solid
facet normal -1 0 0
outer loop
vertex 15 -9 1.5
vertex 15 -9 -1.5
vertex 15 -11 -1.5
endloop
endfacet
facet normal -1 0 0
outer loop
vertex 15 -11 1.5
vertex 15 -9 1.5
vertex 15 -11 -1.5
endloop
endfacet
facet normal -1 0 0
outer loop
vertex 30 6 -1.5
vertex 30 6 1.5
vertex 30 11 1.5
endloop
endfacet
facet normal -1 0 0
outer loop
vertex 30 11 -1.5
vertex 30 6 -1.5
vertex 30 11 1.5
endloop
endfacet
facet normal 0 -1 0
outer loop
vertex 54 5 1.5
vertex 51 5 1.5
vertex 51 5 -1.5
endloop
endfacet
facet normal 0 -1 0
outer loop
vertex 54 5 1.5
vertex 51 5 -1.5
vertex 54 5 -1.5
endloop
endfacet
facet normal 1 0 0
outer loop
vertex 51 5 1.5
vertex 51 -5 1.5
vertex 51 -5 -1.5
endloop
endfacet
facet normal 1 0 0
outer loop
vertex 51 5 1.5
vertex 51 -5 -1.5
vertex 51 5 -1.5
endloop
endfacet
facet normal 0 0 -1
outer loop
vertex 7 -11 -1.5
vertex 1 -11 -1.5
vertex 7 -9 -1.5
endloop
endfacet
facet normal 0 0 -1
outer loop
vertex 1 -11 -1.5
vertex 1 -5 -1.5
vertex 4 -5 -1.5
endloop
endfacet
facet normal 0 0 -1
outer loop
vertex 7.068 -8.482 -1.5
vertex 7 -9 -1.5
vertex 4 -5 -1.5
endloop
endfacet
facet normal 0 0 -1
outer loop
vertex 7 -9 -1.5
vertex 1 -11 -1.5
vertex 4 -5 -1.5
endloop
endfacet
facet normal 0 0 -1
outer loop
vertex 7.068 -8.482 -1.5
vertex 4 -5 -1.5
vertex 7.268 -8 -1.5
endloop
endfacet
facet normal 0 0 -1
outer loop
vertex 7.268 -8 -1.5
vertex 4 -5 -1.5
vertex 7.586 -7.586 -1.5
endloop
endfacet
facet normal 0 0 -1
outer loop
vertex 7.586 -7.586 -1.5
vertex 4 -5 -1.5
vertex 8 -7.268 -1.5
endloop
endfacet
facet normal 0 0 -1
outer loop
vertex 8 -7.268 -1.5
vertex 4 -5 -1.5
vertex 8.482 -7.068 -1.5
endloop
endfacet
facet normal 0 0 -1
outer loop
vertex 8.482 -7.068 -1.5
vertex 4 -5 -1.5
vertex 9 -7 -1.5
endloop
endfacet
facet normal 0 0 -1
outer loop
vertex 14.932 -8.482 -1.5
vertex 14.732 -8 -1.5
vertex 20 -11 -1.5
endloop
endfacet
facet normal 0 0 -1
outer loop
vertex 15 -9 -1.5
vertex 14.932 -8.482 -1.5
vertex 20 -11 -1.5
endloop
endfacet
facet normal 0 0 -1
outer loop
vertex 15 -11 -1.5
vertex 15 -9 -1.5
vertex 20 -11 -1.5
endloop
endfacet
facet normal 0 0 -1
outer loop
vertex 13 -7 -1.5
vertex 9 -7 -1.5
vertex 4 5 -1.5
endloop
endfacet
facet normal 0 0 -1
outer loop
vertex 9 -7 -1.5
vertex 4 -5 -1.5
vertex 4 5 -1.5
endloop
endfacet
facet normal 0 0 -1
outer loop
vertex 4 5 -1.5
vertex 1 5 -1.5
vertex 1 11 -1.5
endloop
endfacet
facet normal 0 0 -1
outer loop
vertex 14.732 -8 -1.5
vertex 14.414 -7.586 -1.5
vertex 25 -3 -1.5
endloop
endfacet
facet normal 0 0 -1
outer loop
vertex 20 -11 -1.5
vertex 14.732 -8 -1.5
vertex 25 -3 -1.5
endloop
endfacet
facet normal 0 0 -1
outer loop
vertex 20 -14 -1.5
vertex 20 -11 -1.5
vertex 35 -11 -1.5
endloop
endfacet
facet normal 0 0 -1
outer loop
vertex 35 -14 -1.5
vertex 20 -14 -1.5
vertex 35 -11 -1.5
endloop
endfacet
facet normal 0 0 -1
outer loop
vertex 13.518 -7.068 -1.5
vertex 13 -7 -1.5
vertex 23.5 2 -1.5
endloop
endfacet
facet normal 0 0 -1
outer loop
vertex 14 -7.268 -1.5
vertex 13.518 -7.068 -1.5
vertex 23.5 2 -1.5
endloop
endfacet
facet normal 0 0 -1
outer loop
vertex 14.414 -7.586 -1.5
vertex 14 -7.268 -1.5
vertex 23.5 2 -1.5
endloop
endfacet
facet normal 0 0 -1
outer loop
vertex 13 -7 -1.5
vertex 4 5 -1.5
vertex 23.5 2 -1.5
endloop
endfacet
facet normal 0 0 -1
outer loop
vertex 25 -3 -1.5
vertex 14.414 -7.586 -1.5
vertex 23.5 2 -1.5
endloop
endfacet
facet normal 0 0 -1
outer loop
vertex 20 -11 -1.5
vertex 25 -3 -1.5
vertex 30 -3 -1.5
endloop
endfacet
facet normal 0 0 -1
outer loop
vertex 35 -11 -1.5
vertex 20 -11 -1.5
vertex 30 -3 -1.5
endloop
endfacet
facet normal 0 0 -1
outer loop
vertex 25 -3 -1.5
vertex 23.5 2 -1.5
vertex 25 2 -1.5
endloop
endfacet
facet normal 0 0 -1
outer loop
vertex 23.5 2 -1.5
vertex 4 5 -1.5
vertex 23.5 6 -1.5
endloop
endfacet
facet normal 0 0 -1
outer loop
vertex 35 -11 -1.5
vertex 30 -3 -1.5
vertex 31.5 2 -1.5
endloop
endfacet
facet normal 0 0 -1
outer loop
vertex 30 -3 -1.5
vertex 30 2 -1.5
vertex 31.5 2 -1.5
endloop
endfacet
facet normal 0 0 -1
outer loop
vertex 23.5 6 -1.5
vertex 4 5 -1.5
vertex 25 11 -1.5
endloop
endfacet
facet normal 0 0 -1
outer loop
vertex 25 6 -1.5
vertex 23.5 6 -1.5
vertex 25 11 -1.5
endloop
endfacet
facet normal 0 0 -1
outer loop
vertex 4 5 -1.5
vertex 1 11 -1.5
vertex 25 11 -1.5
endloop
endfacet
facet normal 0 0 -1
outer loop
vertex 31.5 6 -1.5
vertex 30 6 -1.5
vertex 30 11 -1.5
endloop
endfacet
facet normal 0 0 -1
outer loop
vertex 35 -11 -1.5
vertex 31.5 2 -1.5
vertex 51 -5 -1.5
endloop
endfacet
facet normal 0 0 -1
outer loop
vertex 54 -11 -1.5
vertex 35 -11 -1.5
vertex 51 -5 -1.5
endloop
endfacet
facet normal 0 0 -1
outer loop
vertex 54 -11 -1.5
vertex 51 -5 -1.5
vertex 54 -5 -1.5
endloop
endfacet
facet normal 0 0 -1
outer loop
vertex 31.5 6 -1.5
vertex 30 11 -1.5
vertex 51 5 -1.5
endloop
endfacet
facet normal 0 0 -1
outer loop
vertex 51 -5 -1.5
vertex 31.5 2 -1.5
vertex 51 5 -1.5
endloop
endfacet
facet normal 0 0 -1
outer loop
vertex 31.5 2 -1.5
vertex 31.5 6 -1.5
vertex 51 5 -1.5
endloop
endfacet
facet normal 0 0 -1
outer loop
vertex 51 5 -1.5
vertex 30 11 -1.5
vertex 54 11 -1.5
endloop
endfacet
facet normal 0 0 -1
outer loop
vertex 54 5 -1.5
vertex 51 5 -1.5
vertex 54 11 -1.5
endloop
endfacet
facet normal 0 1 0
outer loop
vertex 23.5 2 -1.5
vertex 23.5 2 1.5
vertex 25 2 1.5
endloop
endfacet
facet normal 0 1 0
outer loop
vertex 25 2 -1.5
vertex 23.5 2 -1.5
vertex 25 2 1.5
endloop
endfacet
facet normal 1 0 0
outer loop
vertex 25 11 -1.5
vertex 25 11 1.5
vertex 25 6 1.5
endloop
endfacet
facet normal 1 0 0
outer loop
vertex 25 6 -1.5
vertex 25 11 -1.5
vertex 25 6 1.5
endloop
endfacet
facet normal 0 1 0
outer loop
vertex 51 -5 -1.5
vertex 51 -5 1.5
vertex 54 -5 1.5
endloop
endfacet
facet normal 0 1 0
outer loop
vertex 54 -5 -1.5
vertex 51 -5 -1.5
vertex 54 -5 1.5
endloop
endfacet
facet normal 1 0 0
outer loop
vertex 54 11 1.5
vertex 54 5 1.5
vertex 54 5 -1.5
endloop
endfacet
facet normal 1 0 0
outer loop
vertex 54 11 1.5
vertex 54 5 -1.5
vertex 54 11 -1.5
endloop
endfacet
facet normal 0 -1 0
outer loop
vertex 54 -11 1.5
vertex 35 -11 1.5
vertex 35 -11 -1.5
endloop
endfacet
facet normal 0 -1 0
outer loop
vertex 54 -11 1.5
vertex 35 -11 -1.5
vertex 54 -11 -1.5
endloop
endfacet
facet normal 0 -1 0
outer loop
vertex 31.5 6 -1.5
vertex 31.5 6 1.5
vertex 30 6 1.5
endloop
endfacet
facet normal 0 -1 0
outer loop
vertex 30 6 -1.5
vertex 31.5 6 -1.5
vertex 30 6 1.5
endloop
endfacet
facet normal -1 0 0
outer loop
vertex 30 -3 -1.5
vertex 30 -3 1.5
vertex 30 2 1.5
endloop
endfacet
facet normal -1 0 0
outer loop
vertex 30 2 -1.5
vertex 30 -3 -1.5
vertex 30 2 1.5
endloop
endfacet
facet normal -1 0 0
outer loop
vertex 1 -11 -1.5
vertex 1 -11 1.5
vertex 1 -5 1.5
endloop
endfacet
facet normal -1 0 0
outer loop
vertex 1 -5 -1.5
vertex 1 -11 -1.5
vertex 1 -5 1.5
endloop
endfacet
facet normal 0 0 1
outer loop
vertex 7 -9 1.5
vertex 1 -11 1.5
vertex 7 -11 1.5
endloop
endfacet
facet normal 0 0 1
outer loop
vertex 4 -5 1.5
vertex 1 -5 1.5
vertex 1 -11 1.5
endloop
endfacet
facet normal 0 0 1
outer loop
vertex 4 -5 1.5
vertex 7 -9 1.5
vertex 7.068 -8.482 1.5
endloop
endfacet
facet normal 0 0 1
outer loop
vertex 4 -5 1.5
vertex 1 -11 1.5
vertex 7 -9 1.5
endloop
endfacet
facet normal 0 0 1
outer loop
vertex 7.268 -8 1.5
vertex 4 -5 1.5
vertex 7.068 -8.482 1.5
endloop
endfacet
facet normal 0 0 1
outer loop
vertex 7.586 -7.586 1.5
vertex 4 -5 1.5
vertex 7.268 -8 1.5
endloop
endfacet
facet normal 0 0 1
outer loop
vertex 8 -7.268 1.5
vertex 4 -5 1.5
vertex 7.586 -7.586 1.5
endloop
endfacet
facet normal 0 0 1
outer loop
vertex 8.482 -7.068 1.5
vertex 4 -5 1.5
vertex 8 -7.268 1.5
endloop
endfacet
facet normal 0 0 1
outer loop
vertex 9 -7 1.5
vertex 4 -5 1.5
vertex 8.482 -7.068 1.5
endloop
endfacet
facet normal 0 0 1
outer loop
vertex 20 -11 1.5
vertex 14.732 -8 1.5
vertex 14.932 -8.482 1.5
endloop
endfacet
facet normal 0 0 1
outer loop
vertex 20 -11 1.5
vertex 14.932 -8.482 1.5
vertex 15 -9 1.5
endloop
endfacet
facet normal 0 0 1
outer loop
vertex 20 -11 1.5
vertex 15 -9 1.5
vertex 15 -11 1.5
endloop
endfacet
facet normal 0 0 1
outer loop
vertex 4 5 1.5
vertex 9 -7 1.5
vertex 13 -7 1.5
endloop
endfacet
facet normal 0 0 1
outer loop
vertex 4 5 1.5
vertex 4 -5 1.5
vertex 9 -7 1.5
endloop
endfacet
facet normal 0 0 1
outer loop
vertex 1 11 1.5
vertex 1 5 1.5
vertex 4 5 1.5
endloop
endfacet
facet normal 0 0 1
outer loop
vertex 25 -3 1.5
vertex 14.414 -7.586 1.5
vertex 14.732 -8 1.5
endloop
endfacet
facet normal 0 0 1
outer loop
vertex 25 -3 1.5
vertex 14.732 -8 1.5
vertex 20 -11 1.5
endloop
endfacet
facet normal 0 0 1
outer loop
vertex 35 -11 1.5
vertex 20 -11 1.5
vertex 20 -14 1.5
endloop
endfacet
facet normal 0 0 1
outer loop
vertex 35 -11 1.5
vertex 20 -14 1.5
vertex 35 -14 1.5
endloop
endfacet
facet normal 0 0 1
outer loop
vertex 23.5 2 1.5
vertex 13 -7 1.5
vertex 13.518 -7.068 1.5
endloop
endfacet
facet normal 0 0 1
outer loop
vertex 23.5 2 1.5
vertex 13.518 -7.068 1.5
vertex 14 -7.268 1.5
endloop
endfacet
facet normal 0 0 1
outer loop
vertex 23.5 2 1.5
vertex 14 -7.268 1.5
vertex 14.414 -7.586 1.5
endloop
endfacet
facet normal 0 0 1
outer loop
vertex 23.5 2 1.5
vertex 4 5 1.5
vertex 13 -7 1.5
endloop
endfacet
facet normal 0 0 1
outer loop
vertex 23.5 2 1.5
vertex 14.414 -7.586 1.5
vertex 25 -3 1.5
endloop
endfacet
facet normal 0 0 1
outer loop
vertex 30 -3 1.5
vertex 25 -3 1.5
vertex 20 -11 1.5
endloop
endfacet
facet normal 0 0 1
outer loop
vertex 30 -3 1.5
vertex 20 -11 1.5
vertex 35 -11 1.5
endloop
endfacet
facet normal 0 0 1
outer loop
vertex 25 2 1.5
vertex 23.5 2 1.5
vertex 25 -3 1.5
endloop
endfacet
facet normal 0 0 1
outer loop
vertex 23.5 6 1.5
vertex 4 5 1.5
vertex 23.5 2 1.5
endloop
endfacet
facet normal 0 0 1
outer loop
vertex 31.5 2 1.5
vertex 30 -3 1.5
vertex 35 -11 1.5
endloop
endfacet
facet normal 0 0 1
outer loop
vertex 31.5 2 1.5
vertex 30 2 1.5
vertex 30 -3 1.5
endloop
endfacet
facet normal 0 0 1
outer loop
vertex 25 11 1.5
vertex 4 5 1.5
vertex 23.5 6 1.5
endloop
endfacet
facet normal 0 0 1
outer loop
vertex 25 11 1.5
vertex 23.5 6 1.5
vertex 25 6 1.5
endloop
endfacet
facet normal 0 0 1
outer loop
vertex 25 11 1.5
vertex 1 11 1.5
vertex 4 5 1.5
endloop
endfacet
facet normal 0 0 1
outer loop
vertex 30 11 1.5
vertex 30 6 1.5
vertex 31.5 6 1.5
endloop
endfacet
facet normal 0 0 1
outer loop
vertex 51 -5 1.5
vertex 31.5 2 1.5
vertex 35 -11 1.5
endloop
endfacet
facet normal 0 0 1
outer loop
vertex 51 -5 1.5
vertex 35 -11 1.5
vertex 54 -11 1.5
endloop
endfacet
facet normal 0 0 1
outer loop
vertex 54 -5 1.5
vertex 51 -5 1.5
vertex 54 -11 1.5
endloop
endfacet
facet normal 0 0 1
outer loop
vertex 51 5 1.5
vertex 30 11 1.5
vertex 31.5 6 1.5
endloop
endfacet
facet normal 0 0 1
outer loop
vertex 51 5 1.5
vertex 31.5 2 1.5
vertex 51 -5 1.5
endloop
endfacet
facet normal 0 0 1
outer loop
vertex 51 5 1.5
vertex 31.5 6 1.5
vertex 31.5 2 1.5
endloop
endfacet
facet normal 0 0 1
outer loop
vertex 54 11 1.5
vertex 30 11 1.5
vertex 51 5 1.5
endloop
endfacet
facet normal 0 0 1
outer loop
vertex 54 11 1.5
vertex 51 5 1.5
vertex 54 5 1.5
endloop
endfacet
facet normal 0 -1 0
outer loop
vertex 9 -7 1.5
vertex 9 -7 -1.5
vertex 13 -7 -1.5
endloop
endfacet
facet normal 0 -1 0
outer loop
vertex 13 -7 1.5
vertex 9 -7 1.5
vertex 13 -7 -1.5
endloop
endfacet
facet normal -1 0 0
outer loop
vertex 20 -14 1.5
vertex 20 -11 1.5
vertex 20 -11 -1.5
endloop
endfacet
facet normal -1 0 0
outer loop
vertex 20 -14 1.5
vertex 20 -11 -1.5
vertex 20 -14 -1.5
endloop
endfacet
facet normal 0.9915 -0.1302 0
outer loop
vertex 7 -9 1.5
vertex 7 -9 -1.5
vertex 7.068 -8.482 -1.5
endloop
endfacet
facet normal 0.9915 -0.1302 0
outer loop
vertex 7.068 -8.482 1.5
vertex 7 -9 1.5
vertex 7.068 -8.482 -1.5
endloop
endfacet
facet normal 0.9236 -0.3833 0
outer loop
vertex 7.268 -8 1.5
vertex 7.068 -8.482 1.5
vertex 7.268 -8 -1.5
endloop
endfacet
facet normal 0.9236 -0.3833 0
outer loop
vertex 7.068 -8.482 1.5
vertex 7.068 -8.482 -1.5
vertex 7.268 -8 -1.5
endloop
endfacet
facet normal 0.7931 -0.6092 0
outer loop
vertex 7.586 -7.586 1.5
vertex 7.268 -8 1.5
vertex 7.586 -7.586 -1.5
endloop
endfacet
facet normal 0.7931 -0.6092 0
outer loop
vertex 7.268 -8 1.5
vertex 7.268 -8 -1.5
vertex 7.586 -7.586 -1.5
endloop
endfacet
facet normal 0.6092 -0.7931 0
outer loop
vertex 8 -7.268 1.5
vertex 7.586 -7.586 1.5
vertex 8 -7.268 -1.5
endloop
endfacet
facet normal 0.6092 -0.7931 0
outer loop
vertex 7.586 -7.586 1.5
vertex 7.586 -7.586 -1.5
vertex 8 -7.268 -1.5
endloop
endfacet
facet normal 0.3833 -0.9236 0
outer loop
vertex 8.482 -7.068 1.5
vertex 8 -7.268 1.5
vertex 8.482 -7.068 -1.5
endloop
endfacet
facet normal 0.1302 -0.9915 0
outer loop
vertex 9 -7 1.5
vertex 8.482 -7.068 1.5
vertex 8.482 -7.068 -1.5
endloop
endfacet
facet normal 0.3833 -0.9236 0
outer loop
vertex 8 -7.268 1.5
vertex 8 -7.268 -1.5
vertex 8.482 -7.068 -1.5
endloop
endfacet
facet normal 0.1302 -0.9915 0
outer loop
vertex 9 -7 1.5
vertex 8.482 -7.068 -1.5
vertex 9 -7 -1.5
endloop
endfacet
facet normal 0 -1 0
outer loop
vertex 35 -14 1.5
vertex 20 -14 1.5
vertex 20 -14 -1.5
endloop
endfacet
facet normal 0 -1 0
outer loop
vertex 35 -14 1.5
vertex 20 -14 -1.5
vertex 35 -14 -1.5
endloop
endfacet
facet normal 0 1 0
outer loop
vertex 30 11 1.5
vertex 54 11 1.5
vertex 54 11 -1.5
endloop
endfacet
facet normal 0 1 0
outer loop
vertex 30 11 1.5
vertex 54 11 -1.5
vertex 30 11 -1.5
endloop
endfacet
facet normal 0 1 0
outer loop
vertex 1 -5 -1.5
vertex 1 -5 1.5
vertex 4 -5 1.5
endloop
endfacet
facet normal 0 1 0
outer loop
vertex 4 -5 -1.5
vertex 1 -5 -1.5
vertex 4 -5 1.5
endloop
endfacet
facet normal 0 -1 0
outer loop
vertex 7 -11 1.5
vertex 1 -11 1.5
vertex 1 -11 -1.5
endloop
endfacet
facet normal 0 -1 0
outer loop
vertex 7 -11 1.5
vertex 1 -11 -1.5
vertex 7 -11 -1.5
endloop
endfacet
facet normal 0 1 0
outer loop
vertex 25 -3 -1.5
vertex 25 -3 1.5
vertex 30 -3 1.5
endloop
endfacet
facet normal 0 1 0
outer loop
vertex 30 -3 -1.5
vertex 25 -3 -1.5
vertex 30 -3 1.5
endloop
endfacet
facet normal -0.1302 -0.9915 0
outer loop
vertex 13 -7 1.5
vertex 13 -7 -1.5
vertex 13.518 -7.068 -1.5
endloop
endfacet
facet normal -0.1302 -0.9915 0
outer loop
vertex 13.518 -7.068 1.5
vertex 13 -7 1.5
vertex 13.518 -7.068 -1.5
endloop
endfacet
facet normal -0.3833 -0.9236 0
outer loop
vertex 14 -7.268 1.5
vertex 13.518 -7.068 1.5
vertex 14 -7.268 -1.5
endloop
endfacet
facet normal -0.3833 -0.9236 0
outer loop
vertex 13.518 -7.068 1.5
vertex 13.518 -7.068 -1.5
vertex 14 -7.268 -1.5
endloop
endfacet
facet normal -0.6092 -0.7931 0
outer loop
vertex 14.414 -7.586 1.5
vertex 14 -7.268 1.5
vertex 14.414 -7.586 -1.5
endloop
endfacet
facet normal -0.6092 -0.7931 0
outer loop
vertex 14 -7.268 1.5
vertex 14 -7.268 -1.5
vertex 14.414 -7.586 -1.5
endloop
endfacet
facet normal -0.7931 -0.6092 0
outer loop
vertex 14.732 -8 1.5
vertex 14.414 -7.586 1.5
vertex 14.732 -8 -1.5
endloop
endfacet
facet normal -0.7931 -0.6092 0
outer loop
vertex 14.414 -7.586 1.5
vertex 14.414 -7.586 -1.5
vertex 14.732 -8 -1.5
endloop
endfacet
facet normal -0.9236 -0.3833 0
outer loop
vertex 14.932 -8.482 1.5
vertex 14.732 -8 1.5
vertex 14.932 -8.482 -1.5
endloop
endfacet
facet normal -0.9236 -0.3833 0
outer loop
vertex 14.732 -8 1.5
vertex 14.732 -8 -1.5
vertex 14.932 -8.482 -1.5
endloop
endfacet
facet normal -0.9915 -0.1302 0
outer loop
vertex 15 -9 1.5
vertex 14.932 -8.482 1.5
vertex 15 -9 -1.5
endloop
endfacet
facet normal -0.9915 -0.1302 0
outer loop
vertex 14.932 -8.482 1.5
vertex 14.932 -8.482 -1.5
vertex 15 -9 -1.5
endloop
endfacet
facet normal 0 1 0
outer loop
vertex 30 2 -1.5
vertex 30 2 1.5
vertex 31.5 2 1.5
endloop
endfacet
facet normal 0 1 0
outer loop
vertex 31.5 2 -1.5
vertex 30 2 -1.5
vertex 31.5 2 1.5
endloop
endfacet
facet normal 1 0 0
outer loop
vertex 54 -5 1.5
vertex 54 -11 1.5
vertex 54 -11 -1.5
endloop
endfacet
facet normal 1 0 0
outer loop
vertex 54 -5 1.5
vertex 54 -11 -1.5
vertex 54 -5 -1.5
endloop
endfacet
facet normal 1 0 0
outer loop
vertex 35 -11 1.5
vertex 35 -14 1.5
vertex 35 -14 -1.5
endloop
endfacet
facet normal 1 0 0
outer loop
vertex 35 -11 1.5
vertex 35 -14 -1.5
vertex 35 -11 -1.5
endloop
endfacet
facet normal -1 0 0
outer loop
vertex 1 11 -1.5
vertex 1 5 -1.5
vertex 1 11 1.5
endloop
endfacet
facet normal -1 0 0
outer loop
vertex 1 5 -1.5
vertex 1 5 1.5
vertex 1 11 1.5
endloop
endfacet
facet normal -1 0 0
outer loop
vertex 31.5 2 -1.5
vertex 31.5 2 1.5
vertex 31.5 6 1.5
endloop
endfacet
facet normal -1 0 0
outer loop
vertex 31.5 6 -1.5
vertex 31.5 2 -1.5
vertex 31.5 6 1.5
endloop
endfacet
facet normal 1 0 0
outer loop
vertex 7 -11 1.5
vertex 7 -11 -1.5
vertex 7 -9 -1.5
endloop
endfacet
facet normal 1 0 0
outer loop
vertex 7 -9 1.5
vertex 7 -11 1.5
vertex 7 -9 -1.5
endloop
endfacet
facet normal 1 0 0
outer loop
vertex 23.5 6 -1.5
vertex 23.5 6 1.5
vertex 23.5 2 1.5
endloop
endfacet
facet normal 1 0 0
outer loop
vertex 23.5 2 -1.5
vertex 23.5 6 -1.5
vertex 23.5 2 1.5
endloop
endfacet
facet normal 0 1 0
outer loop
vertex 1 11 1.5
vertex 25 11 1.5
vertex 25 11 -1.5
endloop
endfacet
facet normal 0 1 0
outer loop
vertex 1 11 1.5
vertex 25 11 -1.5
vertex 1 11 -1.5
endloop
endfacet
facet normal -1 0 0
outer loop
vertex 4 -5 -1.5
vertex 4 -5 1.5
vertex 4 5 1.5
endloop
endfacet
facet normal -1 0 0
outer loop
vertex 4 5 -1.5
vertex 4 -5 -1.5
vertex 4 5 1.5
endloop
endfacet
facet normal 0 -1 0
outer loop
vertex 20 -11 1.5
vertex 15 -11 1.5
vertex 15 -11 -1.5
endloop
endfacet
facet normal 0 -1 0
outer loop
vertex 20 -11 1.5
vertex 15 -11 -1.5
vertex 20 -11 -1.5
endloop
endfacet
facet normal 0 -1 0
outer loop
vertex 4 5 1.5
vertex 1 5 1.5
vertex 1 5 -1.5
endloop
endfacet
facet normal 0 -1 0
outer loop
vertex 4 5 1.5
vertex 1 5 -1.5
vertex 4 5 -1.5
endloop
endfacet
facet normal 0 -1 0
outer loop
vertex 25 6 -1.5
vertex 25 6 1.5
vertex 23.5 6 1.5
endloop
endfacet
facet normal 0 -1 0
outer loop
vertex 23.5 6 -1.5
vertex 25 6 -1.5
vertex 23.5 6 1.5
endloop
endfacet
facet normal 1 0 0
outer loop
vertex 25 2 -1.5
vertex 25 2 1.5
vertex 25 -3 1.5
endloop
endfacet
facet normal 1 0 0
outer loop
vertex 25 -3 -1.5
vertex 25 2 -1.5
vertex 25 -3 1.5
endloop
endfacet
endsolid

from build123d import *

# Parameters (mm, degrees)
BOSS_EXTRUDE1_DEPTH = 1.5
SKETCH2_W           = 3
SKETCH2_H           = 10
CUT_EXTRUDE1_DEPTH  = 56.865910894
SKETCH3_W           = 55
SKETCH3_H           = 25
CUT_EXTRUDE2_DEPTH  = 56.865910894
CUT_EXTRUDE3_DEPTH  = 56.865910894
CUT_EXTRUDE4_DEPTH  = 56.865910894


with BuildPart() as part:
    # Sketch1 → Boss-Extrude1 (new, symmetric)
    with BuildSketch(Plane.XY):
        Polygon((-20, -11), (20, -11), (20, -14), (35, -14), (35, -11), (54, -11), (54, 11), (-54, 11), (-54, -11), (-35, -11), (-35, -14), (-20, -14), align=None)
    extrude(amount=BOSS_EXTRUDE1_DEPTH, both=True)

    # Sketch2 → Cut-Extrude1 (cut, through all)
    with BuildSketch(Plane.XY.offset(1.5)):
        with Locations((2.5, 0)):
            Rectangle(SKETCH2_W, SKETCH2_H)
        with Locations((52.5, 0)):
            Rectangle(SKETCH2_W, SKETCH2_H)
    extrude(amount=-CUT_EXTRUDE1_DEPTH, mode=Mode.SUBTRACT)

    # Sketch3 → Cut-Extrude2 (cut, through all)
    with BuildSketch(Plane.XY.offset(1.5)):
        with Locations((-26.5, -1.5)):
            Rectangle(SKETCH3_W, SKETCH3_H)
    extrude(amount=-CUT_EXTRUDE2_DEPTH, mode=Mode.SUBTRACT)

    # Sketch4 → Cut-Extrude3 (cut, through all)
    with BuildSketch(Plane(origin=(0, 0, -1.5), x_dir=(-1, 0, 0), z_dir=(0, 0, -1))):
        with BuildLine():
            Line((-7, -11), (-7, -9))
            ThreePointArc((-7, -9), (-7.585786438, -7.585786438), (-9, -7))
            Line((-9, -7), (-13, -7))
            ThreePointArc((-13, -7), (-14.414213562, -7.585786438), (-15, -9))
            Line((-15, -9), (-15, -11))
            Line((-15, -11), (-7, -11))
        make_face()
    extrude(amount=-CUT_EXTRUDE3_DEPTH, mode=Mode.SUBTRACT)

    # Sketch5 → Cut-Extrude4 (cut, through all)
    with BuildSketch(Plane.XY.offset(1.5)):
        Polygon((25, 11), (25, 6), (23.5, 6), (23.5, 2), (25, 2), (25, -3), (30, -3), (30, 2), (31.5, 2), (31.5, 6), (30, 6), (30, 11), align=None)
    extrude(amount=-CUT_EXTRUDE4_DEPTH, mode=Mode.SUBTRACT)


solid = part.part
